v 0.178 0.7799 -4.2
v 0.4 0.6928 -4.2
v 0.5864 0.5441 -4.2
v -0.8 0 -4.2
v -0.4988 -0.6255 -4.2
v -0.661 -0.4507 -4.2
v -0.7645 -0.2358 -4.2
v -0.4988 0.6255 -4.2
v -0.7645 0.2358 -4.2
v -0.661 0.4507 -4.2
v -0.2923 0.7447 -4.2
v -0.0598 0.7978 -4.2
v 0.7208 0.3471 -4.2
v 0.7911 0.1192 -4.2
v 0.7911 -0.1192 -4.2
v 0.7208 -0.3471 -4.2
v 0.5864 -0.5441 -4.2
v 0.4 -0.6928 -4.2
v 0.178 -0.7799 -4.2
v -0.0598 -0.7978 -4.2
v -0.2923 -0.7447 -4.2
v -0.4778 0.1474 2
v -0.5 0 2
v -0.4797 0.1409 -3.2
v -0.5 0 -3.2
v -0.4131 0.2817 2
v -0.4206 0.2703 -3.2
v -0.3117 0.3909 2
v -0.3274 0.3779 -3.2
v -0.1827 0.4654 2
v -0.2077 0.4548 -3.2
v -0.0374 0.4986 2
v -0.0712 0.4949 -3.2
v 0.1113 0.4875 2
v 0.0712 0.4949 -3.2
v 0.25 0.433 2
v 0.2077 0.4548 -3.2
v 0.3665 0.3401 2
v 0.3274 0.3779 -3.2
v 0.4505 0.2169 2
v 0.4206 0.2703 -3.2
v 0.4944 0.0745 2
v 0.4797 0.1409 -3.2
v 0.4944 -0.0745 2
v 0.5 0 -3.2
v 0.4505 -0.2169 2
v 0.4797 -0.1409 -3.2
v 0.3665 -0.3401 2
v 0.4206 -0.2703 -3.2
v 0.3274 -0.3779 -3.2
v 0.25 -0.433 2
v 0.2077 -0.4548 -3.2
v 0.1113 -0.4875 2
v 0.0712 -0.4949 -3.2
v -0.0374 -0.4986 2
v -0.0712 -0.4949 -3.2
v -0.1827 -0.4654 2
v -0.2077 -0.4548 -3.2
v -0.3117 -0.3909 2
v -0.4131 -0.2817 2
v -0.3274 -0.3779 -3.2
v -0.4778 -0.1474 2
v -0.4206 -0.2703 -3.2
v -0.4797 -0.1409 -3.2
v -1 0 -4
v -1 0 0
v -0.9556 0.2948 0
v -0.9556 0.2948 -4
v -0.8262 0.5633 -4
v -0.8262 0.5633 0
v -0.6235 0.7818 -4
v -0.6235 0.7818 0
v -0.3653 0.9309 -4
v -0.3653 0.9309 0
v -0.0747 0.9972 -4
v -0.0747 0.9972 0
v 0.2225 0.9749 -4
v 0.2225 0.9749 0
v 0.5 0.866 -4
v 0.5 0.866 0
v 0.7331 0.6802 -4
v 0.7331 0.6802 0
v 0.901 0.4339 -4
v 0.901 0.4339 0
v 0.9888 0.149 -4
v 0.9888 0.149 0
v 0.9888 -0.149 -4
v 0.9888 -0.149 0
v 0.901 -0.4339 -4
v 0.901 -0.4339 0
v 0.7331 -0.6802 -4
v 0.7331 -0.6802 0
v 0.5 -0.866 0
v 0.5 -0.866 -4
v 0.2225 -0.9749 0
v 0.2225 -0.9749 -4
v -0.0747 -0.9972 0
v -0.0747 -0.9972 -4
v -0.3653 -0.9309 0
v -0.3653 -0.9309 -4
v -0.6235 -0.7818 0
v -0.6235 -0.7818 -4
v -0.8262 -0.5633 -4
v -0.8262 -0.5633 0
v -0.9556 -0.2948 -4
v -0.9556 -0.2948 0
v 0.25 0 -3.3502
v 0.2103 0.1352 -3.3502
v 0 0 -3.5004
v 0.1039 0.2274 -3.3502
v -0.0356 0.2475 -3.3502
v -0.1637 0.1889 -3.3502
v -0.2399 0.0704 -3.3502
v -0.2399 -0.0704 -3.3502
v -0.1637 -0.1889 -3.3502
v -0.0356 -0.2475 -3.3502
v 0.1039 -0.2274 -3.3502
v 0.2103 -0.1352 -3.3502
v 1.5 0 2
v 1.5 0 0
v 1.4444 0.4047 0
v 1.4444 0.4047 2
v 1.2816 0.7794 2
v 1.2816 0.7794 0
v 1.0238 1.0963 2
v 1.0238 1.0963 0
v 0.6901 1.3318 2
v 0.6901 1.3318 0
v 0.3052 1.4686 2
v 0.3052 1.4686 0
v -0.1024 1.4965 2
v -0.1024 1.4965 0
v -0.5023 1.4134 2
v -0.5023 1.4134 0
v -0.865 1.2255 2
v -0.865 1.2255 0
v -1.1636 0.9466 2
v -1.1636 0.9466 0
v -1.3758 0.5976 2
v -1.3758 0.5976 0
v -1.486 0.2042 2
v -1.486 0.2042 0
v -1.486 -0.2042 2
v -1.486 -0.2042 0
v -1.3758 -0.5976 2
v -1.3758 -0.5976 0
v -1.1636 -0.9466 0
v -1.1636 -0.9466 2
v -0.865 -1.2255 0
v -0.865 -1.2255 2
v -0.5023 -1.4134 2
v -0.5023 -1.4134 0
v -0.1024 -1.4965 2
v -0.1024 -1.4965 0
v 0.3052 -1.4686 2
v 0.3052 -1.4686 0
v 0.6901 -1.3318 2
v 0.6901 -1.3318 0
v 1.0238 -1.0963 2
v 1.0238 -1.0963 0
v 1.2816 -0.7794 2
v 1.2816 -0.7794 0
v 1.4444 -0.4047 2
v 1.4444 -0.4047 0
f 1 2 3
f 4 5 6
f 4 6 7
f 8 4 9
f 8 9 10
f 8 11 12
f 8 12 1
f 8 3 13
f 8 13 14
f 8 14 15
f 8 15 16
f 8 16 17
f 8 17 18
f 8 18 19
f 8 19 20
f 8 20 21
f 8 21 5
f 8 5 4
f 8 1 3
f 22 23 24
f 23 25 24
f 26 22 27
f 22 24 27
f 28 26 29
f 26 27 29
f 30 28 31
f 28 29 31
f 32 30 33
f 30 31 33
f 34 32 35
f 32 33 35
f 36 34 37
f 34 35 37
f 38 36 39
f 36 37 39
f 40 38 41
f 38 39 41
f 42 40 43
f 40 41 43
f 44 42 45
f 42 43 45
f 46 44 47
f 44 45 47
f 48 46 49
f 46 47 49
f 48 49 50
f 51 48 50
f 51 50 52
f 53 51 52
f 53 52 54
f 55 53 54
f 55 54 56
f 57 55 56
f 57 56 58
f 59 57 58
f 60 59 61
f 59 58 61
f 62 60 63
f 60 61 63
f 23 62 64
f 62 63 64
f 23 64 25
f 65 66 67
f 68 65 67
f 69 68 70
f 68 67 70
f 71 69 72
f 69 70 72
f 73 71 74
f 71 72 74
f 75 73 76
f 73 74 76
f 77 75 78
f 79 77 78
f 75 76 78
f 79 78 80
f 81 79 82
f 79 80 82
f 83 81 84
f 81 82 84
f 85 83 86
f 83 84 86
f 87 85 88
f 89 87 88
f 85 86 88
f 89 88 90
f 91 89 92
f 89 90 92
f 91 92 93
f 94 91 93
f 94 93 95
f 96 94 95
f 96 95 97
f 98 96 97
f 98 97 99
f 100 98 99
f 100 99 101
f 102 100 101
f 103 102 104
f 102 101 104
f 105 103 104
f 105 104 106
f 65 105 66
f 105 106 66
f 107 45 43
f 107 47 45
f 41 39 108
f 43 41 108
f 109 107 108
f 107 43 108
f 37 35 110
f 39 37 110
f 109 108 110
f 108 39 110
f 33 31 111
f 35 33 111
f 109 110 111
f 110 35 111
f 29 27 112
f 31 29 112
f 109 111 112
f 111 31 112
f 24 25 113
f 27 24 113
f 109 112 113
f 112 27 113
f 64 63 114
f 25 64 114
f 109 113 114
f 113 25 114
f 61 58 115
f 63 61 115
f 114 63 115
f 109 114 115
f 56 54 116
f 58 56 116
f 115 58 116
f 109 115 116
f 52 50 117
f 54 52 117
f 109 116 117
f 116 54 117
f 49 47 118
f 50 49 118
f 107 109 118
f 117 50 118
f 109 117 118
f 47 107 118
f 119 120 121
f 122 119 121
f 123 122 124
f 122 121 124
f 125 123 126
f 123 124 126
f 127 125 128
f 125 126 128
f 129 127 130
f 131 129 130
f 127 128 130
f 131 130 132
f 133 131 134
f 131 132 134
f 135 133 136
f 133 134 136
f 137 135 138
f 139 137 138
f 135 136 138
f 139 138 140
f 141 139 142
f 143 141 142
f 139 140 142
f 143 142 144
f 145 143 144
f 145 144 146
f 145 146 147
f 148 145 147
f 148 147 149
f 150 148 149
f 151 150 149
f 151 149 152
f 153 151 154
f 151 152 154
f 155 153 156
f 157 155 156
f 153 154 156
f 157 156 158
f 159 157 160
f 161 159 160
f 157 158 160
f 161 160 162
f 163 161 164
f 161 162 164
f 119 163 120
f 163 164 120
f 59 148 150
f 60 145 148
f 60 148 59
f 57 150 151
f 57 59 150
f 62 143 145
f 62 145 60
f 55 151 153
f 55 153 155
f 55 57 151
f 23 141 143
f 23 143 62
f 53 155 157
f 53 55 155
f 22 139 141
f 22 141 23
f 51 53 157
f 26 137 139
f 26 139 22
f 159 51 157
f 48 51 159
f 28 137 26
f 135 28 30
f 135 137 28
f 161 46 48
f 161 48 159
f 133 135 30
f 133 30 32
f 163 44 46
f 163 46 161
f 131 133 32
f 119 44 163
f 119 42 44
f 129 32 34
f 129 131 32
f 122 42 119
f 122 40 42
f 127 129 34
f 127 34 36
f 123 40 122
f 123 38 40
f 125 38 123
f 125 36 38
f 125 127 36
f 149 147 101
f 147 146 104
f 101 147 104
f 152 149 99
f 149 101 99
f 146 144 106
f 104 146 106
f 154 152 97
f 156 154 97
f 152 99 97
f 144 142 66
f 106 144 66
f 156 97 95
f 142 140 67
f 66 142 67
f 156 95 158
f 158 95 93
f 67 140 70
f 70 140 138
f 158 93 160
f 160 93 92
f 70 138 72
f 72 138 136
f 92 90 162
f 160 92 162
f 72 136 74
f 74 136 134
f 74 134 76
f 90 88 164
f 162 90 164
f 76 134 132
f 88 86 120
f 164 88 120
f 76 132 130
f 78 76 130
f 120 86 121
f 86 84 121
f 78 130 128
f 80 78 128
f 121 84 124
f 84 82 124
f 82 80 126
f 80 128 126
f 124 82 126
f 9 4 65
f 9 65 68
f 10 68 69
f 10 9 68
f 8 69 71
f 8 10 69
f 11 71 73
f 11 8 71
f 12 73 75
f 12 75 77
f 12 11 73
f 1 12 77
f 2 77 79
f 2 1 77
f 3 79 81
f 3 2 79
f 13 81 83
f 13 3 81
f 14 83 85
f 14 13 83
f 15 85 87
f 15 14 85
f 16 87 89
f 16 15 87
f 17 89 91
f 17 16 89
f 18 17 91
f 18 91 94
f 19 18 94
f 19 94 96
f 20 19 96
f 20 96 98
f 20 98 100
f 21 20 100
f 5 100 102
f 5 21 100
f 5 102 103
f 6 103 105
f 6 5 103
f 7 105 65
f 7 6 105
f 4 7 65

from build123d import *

# Parameters (mm, degrees)
SKETCH_1_R      = 1.5
EXTRUDE_1_DEPTH = 2
SKETCH_2_R      = 1
EXTRUDE_2_DEPTH = 4.2
CHAMFER_1_SIZE  = 0.2
MM_1_D          = 1
MM_1_DEPTH      = 5.2
MM_1_TIP        = 0.30043031


with BuildPart() as part:
    # 草图1 → 凸台-拉伸1 (new body)
    with BuildSketch(Plane.XY):
        Circle(SKETCH_1_R)
    extrude(amount=EXTRUDE_1_DEPTH)

    # 草图2 → 凸台-拉伸2 (add)
    with BuildSketch(Plane(origin=(0, 0, 0), x_dir=(-1, 0, 0), z_dir=(0, 0, -1))):
        Circle(SKETCH_2_R)
    extrude(amount=EXTRUDE_2_DEPTH)

    # 倒角1
    chamfer_1_edges = [part.edges().sort_by_distance(p)[0] for p in [
        (1, 0, -4.2),
    ]]
    chamfer(chamfer_1_edges, length=CHAMFER_1_SIZE)

    # 大小mm 暗销孔1
    with Locations(Plane.XY.offset(2)):
        with Locations((0, 0)):
            Hole(MM_1_D / 2, depth=MM_1_DEPTH)
            with Locations((0, 0, -(MM_1_DEPTH + MM_1_TIP / 2))):  # 118° drill point
                Cone(0, MM_1_D / 2, MM_1_TIP, mode=Mode.SUBTRACT)


solid = part.part
